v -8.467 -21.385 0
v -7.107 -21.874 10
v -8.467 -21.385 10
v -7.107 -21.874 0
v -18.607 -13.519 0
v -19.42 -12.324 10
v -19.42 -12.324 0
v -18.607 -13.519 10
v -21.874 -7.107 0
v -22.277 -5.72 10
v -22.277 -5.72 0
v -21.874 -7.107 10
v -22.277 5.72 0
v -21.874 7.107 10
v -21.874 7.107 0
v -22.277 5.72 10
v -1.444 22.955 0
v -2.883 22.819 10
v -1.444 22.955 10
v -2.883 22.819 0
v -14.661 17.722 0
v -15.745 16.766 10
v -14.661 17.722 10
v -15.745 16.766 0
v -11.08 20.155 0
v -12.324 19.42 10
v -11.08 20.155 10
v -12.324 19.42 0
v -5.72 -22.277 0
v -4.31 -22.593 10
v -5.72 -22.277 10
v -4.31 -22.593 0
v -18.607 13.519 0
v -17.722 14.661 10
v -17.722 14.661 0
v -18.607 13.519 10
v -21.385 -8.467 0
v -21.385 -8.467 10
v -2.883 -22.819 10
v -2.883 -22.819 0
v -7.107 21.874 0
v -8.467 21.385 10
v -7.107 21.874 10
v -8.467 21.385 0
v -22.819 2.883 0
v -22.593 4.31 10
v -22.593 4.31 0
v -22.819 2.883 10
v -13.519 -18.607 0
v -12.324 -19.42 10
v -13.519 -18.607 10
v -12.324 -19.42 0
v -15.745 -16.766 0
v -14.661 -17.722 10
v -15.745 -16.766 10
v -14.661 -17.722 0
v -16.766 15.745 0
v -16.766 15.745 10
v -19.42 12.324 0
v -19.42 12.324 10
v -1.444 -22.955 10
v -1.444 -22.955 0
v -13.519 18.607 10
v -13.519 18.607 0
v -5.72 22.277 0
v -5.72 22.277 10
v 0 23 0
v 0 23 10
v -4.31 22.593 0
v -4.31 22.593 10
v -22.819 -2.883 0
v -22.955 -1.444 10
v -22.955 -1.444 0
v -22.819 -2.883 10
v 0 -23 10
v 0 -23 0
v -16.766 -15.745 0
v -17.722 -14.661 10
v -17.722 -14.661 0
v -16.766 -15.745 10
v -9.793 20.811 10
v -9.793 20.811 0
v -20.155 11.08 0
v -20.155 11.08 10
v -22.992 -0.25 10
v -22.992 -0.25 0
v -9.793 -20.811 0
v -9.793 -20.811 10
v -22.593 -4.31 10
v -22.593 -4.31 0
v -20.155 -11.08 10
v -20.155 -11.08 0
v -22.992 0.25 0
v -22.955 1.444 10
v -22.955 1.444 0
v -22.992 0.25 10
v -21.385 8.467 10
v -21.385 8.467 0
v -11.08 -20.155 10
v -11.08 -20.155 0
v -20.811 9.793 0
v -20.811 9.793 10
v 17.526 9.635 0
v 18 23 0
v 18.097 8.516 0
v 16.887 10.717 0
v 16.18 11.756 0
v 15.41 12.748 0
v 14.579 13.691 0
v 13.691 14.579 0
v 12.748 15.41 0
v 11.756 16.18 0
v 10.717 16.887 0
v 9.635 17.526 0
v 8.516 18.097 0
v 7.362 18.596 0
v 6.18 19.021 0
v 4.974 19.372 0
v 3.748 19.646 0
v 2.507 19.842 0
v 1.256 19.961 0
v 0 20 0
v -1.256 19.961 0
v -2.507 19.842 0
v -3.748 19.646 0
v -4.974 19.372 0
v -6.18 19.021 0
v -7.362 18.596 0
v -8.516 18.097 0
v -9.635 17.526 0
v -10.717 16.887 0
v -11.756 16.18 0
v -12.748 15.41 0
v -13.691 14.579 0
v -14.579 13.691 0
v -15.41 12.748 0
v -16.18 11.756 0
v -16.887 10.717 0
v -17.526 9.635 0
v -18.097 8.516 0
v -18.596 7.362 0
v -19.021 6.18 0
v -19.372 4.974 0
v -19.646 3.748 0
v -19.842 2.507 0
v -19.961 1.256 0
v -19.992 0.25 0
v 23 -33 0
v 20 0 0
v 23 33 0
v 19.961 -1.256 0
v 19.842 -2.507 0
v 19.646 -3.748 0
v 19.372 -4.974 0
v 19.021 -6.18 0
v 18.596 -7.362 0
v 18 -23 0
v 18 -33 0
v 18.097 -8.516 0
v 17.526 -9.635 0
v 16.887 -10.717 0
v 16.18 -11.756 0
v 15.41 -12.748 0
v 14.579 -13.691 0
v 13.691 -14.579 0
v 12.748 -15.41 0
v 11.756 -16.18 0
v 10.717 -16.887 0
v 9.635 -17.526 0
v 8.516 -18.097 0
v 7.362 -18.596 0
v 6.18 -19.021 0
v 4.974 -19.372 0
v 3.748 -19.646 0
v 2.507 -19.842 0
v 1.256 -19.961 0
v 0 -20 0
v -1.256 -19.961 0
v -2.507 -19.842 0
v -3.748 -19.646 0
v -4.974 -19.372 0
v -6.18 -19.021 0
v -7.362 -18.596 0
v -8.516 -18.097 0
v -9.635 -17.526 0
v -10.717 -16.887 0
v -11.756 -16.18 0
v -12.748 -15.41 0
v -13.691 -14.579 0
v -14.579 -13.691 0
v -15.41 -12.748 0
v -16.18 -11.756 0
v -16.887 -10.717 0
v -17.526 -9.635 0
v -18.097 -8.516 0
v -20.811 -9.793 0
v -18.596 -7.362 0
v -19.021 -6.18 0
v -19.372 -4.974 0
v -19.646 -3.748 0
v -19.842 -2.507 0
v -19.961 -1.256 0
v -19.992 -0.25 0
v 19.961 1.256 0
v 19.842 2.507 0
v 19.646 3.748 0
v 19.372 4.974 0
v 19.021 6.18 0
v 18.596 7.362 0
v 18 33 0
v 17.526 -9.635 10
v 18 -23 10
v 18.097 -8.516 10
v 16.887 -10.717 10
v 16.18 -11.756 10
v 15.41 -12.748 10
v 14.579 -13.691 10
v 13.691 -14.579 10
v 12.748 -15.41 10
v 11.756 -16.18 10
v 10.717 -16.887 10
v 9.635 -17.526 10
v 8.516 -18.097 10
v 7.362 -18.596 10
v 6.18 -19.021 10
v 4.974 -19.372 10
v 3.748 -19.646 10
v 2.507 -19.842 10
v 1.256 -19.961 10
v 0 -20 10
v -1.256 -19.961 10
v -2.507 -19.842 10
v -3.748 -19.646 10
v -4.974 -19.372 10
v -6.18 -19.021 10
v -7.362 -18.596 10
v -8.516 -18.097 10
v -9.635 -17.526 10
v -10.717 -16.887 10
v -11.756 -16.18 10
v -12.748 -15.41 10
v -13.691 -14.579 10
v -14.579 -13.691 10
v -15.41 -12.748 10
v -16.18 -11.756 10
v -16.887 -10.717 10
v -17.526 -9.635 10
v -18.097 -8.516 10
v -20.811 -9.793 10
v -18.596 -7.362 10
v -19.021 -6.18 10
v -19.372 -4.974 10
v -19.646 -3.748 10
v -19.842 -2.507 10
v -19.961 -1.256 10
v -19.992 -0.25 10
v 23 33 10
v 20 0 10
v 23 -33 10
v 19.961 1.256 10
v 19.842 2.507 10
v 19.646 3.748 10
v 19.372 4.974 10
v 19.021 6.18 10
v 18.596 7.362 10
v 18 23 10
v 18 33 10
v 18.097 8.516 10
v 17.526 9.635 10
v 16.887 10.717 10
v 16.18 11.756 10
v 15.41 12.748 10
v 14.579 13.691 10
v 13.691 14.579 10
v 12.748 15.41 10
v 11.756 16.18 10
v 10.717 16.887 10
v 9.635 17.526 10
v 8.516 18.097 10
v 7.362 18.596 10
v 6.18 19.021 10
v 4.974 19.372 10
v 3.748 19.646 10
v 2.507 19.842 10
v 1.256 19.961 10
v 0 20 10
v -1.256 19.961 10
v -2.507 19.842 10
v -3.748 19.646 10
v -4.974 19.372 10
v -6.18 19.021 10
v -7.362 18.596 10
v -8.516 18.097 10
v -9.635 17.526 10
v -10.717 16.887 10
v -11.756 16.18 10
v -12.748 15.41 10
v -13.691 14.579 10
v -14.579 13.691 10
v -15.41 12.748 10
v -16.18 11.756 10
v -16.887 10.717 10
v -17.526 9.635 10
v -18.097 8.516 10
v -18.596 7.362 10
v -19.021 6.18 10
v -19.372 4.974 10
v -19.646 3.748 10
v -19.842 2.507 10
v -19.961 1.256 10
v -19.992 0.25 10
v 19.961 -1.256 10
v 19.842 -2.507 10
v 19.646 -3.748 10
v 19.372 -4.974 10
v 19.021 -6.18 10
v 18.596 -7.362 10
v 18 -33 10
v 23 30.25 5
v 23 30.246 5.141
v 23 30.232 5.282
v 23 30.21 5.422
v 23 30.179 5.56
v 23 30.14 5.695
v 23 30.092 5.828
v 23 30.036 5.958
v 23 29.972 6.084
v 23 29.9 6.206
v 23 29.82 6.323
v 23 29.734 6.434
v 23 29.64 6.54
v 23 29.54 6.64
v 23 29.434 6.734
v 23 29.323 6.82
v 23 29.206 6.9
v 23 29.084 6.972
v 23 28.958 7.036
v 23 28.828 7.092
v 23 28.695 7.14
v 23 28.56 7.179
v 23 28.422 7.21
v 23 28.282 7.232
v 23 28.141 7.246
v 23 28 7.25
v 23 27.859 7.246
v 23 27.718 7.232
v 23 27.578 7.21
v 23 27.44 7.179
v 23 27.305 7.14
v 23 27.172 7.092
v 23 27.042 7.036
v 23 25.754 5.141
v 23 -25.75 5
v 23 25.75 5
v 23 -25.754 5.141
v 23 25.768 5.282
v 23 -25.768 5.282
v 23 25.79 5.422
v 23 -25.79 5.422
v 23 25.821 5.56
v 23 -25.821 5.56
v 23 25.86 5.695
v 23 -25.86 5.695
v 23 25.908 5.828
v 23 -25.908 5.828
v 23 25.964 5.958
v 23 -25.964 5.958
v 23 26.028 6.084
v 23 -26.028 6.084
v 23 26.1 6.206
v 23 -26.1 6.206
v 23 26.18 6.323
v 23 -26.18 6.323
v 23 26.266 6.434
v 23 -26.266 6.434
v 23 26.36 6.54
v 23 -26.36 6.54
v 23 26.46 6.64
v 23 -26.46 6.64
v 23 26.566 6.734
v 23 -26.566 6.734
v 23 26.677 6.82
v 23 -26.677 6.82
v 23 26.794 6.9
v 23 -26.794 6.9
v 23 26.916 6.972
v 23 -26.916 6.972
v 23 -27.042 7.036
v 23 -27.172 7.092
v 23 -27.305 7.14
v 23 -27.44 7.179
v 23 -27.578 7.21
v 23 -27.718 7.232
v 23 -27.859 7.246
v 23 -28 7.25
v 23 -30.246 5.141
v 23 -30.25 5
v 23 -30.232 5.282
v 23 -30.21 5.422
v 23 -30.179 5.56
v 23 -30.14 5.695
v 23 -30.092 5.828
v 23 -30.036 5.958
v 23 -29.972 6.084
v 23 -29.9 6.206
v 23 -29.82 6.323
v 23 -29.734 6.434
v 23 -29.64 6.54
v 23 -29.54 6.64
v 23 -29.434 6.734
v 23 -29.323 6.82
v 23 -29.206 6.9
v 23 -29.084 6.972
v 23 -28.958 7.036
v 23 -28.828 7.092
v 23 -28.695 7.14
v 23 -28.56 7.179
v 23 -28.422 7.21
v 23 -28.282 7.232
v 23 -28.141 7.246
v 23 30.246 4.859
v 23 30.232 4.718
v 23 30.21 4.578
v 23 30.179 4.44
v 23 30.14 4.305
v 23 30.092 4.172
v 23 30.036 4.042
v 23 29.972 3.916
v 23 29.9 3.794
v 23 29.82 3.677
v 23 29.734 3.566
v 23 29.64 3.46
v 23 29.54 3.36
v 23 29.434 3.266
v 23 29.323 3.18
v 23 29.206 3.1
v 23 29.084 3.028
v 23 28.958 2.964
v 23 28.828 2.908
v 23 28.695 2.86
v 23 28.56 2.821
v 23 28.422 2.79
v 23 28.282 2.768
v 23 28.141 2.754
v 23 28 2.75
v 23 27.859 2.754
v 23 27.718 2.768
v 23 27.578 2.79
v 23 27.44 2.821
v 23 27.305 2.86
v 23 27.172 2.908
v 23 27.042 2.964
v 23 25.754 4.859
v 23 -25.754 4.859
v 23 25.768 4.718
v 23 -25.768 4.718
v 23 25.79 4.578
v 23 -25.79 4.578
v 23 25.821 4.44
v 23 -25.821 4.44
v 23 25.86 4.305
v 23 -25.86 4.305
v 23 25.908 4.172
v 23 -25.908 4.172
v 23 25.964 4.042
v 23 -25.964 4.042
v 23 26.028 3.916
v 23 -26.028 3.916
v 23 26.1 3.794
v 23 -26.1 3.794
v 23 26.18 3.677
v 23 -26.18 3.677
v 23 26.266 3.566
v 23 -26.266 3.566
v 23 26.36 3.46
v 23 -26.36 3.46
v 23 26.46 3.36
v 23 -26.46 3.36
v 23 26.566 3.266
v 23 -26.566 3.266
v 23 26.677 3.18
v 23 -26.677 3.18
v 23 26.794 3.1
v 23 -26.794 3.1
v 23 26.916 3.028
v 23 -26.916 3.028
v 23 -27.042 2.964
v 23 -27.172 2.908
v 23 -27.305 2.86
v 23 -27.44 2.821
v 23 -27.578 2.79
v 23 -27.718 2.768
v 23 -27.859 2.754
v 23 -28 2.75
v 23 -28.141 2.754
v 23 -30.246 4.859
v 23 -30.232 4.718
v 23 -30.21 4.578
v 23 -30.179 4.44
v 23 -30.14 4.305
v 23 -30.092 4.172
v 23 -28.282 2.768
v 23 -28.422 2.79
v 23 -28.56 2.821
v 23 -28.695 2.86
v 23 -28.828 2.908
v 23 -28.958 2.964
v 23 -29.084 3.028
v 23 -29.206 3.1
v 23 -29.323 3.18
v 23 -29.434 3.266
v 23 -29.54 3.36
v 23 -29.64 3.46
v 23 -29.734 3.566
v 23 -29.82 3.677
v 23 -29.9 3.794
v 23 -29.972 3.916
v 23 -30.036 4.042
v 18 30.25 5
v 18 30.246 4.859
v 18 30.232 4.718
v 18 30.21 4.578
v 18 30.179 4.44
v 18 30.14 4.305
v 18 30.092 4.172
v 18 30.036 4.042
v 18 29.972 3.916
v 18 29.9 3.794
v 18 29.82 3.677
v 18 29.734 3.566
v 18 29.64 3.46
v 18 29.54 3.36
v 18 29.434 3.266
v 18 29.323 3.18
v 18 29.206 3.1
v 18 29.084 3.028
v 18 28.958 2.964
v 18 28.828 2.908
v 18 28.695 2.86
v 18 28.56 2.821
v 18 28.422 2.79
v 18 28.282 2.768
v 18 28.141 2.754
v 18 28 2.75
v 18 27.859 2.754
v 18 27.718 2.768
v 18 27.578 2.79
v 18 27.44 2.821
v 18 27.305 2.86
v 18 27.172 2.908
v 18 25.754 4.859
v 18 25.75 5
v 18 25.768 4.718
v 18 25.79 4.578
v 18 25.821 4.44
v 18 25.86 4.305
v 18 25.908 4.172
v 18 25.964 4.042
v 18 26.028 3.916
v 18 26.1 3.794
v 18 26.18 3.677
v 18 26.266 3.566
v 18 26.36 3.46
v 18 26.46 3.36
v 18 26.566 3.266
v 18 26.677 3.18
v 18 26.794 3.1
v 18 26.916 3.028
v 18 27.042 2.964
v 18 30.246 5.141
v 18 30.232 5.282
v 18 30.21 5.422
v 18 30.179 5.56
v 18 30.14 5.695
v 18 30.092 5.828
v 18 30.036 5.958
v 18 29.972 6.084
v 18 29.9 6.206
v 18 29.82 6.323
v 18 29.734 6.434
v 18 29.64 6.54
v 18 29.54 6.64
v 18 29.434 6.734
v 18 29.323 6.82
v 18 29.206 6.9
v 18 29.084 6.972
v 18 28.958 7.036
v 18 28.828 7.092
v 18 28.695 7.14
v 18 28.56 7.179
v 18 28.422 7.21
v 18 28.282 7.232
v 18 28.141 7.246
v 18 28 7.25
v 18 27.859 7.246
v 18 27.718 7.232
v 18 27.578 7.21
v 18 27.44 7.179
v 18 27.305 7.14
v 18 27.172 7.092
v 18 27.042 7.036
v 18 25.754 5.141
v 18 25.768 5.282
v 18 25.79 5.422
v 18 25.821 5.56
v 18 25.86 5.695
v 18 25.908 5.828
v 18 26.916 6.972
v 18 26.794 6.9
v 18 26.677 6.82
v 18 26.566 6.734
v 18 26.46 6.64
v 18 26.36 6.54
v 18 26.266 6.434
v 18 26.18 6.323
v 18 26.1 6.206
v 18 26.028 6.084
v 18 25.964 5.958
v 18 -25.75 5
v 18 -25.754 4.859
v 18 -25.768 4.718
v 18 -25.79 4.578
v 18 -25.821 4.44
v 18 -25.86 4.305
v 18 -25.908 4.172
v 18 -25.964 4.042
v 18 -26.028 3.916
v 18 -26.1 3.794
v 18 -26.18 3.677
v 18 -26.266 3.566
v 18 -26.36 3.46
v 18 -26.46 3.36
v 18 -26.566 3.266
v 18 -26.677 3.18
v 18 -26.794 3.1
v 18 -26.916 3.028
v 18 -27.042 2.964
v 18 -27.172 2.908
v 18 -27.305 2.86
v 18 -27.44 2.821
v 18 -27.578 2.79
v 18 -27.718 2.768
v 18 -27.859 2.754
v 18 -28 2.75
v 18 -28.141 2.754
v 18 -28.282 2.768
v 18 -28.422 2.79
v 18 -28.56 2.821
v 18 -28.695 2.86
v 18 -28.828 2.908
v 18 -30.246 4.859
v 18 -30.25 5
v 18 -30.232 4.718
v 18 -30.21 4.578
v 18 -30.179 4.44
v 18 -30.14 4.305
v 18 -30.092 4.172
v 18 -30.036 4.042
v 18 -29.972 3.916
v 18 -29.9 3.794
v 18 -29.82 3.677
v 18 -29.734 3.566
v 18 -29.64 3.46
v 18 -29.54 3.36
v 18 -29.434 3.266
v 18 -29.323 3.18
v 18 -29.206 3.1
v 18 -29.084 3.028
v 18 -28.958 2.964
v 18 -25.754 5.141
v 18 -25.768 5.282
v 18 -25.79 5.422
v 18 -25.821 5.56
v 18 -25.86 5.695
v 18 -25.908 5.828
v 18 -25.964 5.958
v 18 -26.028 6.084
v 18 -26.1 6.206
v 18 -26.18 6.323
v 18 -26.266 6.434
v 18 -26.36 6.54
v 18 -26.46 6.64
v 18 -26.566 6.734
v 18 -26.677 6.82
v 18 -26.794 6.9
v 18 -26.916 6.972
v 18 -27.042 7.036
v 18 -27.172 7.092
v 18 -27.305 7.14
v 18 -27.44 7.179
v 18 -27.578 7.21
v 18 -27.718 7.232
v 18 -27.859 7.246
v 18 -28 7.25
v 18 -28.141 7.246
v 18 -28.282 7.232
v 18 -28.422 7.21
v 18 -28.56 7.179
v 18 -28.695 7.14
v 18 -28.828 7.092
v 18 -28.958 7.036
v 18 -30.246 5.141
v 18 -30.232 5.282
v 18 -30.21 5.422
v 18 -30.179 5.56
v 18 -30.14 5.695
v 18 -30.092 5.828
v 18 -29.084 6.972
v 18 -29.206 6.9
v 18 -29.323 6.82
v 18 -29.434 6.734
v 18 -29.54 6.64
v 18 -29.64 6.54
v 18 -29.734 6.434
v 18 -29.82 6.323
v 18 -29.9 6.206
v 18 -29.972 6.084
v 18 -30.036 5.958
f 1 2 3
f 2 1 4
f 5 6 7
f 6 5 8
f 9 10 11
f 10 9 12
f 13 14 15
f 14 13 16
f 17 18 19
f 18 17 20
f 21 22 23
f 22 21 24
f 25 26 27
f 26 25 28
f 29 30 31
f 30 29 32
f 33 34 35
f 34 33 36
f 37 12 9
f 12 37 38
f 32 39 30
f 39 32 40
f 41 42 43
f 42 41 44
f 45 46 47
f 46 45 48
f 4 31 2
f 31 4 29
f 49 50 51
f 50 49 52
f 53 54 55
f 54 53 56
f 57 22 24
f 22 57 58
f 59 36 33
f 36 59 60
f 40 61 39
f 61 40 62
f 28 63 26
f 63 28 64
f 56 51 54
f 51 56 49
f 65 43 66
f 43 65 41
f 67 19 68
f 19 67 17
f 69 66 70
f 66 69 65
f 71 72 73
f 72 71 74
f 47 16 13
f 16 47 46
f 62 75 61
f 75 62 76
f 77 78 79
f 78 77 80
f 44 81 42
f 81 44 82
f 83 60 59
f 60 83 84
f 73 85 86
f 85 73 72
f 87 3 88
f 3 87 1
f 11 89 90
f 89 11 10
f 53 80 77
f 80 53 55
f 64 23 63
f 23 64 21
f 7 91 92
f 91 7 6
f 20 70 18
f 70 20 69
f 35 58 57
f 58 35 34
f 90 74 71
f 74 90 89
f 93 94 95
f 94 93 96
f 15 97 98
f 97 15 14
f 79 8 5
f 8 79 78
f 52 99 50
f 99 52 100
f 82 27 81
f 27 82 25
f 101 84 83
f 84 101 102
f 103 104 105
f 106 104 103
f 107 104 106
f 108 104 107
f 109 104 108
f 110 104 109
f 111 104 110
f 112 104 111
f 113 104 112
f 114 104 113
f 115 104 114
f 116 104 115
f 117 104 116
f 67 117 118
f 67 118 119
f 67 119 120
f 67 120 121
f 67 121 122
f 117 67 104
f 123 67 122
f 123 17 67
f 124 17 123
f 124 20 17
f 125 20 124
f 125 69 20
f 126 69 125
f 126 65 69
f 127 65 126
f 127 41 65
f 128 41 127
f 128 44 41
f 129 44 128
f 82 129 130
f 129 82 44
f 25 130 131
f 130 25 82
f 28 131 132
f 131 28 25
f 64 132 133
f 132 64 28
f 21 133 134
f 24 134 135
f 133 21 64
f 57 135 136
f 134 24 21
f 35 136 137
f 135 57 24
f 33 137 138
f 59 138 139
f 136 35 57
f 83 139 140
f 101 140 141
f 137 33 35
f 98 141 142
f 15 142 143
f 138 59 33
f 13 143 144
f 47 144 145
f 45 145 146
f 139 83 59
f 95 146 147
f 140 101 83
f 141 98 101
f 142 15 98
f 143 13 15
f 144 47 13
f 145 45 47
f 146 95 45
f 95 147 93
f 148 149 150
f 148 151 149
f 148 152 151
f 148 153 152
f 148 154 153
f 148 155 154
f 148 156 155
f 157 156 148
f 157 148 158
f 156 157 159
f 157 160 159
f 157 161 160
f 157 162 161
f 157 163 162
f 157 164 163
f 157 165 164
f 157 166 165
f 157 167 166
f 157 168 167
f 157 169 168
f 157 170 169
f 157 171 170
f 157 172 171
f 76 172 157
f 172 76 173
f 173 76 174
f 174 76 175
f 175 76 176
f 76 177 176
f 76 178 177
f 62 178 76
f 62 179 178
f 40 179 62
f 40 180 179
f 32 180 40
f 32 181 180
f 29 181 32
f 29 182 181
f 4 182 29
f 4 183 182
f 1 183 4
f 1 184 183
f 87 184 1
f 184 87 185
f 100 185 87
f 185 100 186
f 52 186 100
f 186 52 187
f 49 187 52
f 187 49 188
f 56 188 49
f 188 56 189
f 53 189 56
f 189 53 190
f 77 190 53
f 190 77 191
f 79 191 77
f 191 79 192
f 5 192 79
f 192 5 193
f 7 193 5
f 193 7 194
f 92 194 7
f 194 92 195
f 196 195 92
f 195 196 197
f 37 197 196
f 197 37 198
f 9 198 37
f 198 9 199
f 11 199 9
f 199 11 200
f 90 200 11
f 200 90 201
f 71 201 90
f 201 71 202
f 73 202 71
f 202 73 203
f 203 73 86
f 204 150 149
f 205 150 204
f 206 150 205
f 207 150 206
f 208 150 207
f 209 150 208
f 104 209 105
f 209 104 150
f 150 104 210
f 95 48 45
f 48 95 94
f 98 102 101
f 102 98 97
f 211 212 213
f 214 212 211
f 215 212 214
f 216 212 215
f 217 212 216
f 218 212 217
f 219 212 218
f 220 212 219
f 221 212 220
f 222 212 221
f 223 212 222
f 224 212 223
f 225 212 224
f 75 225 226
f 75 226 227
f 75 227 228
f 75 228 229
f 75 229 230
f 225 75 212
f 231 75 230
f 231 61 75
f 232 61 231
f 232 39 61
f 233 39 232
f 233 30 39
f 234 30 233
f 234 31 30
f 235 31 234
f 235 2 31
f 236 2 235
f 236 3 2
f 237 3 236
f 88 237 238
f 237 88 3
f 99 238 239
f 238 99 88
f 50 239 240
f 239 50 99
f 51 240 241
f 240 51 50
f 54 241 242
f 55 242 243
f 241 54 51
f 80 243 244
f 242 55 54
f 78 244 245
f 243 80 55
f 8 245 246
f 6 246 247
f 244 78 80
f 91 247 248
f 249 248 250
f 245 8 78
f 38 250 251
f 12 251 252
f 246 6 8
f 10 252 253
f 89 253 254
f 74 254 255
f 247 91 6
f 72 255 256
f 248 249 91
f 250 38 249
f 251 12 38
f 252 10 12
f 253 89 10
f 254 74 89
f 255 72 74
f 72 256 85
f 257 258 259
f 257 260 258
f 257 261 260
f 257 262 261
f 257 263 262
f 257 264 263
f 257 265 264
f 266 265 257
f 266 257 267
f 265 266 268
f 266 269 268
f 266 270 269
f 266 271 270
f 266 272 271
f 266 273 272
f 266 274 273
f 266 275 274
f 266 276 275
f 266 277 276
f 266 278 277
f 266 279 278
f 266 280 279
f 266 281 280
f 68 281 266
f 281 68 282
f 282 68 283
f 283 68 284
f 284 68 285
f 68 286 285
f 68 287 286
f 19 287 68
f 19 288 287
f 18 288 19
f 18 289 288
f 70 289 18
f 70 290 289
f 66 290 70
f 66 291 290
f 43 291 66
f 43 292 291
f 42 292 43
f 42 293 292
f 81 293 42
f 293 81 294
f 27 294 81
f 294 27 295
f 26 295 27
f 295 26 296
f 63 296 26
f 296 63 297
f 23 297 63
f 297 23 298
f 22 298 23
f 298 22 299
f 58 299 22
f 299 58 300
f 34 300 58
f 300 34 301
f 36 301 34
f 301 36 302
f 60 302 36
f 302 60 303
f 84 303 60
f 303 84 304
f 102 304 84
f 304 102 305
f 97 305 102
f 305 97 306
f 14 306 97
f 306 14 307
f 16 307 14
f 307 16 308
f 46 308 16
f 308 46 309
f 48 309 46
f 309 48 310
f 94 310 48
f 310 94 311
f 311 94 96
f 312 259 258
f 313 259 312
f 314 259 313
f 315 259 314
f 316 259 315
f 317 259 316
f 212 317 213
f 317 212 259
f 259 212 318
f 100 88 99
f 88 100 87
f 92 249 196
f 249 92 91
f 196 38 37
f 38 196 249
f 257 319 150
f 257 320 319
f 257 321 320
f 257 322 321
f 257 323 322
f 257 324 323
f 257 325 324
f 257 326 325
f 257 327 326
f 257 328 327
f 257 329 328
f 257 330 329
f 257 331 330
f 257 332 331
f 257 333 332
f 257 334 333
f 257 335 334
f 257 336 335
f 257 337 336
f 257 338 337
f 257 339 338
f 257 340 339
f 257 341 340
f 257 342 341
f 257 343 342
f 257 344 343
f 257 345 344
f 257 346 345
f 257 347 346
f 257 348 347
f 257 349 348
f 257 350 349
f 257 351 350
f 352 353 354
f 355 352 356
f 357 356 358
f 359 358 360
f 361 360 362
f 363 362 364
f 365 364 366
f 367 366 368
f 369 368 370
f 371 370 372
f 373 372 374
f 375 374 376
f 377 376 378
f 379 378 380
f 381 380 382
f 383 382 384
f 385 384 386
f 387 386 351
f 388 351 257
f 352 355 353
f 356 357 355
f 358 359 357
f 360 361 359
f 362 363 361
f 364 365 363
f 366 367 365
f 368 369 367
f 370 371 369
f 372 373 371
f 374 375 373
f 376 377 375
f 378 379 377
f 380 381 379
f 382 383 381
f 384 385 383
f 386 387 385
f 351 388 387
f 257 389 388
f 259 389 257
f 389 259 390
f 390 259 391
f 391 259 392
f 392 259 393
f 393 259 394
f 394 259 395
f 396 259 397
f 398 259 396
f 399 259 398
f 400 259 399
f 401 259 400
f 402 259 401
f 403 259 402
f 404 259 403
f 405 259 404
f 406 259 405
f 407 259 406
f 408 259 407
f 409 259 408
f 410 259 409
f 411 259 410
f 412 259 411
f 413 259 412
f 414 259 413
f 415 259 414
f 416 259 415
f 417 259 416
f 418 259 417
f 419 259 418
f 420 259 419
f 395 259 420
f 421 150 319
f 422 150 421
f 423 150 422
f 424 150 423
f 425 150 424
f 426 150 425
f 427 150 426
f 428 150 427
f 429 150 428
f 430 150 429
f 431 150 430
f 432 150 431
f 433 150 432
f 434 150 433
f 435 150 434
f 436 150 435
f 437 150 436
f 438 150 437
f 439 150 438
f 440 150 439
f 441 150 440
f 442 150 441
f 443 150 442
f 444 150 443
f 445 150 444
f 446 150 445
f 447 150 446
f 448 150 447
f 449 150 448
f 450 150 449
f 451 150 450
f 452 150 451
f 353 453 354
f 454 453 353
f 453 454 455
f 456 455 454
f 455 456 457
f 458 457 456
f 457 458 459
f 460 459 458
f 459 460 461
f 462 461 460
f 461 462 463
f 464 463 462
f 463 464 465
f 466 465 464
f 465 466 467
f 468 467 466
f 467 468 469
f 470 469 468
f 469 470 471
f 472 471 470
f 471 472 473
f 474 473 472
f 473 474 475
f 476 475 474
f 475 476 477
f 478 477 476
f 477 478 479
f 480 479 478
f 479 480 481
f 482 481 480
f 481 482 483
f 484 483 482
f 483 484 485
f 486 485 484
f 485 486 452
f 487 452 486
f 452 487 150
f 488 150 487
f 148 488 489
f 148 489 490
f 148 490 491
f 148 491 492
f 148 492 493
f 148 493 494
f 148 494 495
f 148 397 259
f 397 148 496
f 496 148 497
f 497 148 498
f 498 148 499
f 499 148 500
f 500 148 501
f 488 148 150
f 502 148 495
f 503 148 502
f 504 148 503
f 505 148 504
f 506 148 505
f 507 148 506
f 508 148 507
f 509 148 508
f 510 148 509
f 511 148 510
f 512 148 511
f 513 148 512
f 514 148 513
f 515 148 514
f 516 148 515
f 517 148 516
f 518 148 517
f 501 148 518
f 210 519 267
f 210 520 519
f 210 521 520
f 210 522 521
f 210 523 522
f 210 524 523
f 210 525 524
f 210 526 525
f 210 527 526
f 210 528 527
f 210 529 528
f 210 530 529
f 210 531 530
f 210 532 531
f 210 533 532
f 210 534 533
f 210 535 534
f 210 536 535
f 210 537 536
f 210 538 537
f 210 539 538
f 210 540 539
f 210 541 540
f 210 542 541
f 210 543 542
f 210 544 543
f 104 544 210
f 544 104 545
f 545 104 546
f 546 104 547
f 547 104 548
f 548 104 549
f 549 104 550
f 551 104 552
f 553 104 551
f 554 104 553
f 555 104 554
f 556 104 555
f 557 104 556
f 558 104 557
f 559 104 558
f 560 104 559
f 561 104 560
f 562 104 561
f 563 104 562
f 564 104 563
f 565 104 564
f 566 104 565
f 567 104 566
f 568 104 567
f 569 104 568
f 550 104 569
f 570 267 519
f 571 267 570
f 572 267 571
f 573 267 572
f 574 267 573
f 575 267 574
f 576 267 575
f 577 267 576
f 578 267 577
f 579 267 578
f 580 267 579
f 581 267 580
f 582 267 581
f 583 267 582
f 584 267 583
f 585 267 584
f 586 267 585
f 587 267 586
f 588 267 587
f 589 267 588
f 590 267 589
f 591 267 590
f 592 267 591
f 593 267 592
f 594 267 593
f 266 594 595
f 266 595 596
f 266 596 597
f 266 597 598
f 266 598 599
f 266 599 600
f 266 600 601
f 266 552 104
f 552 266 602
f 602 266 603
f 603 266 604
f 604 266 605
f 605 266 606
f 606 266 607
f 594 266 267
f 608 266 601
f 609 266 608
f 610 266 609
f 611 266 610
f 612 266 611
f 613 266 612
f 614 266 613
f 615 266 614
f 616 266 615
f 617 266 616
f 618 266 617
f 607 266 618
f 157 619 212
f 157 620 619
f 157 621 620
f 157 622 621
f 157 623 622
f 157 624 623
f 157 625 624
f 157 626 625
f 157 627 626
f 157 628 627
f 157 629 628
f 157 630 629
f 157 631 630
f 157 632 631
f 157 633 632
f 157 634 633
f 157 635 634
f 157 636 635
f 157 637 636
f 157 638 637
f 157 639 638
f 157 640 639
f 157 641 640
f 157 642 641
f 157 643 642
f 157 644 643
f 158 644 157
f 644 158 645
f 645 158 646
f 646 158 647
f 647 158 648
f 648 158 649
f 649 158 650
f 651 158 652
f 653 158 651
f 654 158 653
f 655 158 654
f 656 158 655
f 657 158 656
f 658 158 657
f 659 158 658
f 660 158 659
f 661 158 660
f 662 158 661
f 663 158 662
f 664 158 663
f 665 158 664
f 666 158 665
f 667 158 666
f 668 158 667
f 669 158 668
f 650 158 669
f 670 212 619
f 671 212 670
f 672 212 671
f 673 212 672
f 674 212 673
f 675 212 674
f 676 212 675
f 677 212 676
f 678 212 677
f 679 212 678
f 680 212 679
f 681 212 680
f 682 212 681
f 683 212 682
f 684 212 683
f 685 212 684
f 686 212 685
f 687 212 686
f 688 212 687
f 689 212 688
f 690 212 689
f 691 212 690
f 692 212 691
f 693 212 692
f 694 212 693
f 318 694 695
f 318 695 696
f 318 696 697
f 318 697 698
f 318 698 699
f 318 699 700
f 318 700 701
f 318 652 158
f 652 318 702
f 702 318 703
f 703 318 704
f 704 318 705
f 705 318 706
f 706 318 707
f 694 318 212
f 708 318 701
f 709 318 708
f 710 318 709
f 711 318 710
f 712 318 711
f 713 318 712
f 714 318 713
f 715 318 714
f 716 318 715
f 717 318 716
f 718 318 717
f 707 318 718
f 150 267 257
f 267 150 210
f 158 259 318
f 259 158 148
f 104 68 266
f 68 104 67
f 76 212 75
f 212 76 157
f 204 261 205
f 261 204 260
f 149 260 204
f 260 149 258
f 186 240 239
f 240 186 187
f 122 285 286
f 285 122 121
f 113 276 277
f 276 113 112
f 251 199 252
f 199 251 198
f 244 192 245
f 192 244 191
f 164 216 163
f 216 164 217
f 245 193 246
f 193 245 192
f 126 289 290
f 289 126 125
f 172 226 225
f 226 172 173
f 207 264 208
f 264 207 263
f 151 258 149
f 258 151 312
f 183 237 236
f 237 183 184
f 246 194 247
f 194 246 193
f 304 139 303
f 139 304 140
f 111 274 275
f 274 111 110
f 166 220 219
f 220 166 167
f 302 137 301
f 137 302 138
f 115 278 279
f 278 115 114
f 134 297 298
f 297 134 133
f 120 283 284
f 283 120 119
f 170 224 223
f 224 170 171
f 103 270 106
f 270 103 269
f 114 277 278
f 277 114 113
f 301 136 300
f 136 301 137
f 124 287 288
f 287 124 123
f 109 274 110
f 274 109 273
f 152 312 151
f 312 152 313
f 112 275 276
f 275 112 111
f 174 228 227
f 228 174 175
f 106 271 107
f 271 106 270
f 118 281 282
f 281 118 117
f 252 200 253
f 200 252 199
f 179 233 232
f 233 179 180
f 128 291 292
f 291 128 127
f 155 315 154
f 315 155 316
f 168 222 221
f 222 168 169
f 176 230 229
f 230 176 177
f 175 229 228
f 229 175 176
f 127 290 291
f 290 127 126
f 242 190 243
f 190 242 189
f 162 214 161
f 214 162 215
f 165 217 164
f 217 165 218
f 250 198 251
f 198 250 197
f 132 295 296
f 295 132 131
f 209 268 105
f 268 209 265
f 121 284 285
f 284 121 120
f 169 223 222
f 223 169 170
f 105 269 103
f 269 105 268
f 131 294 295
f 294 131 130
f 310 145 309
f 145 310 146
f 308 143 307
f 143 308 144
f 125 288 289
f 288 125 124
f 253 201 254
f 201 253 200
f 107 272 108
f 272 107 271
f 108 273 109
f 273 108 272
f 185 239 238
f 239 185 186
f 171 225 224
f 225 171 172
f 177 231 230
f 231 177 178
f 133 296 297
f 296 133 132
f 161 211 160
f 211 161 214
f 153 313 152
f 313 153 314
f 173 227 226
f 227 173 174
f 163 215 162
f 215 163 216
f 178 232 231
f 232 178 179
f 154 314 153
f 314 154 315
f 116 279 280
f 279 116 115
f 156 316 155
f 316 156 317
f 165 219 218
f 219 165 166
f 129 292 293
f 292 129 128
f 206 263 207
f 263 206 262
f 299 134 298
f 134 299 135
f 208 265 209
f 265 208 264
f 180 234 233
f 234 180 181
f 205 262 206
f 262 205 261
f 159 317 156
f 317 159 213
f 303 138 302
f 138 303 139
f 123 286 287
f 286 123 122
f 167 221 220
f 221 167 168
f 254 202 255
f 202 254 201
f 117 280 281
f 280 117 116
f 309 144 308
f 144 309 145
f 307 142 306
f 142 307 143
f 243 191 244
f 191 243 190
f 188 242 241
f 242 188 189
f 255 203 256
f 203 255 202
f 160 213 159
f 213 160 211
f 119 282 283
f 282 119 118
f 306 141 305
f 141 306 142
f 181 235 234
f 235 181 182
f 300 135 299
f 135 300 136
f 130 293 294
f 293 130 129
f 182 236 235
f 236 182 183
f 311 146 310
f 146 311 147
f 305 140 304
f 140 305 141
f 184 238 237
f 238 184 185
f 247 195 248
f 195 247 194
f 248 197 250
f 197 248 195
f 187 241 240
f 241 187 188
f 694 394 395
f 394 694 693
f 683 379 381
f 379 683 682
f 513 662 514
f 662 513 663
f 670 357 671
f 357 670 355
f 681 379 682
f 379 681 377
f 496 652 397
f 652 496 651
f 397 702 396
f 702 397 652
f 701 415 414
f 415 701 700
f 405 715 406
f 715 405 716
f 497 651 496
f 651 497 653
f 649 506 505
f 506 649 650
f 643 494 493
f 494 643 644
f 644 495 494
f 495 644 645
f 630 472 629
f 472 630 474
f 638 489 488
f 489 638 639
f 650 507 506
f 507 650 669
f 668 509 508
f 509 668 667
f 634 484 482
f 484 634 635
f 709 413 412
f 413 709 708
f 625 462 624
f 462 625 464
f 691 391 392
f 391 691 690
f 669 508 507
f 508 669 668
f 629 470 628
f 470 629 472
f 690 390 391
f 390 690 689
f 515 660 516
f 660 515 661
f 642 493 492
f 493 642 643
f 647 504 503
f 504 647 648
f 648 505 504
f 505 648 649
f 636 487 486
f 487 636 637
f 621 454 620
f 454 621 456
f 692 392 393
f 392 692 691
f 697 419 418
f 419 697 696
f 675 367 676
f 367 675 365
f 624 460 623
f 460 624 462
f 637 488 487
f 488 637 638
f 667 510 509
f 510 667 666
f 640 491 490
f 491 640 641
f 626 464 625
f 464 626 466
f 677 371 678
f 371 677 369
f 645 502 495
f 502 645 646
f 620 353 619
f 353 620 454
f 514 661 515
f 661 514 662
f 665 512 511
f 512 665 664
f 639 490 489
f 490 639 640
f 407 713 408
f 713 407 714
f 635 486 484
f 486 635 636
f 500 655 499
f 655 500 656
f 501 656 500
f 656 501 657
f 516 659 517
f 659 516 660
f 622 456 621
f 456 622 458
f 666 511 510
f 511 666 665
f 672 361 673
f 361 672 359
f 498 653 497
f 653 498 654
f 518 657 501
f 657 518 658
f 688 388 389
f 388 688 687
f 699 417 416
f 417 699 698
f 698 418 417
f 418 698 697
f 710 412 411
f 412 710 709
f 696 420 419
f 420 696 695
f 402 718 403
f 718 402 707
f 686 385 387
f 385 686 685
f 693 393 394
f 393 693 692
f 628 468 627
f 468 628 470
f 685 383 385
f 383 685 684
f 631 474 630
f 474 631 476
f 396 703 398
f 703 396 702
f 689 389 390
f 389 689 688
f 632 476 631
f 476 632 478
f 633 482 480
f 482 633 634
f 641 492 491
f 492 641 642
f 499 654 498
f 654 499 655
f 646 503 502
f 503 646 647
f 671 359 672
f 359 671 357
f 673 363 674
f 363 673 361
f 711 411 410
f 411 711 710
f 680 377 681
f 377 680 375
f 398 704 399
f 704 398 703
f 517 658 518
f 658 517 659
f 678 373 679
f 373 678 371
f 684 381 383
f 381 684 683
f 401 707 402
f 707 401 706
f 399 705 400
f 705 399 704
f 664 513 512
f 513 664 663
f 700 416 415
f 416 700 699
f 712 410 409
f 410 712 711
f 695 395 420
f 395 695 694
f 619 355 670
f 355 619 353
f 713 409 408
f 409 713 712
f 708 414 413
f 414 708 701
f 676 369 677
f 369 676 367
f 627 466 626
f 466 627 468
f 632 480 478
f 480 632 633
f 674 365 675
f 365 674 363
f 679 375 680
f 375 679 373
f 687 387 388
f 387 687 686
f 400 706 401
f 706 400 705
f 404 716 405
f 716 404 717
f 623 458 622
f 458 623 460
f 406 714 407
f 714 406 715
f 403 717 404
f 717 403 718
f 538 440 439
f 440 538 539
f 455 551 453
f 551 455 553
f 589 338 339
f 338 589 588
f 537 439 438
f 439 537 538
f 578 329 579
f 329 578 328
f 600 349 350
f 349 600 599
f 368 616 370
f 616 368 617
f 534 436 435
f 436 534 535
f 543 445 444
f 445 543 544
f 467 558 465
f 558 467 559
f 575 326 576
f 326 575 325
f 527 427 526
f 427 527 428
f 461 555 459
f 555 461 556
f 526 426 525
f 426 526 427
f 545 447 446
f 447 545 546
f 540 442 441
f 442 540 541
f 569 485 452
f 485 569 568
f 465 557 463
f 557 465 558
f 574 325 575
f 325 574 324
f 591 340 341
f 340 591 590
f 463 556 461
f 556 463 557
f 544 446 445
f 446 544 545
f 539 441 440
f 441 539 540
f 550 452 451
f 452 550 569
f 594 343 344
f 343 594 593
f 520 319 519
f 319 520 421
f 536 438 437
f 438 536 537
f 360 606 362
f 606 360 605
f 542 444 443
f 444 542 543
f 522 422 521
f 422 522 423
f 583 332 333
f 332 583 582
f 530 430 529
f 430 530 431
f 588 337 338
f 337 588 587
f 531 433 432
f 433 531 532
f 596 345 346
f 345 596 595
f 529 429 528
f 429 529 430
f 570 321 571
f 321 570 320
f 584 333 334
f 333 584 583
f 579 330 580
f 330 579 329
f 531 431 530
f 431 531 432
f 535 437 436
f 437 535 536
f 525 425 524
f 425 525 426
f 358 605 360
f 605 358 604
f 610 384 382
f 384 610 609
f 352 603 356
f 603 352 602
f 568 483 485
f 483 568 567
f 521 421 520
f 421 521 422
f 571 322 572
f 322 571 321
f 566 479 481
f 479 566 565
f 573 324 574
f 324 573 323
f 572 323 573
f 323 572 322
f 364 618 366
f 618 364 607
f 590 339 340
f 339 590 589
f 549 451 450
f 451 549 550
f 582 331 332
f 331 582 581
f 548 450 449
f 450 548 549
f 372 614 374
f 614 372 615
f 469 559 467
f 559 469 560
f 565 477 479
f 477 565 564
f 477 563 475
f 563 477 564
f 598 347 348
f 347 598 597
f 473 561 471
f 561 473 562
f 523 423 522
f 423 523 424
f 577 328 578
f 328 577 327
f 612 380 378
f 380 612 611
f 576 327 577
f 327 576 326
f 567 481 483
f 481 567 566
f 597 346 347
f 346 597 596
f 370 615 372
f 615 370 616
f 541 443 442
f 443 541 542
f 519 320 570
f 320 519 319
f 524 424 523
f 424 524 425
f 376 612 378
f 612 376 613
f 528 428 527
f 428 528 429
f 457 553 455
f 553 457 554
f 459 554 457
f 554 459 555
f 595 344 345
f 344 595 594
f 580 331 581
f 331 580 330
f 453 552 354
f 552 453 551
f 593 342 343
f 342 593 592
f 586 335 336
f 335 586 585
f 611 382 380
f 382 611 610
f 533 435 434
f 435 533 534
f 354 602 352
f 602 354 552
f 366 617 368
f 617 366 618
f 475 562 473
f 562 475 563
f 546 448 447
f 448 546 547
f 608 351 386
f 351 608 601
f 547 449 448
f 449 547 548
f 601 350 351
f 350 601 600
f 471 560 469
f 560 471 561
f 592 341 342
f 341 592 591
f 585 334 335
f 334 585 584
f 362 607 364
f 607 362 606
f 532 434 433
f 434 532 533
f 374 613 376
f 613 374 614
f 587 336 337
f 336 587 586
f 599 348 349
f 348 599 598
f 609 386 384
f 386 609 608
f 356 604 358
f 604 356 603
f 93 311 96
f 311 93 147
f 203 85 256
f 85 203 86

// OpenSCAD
// [FL_INDEX: keywords="openscad, 3d_parametric, Parametric_Cable_Tamer, csg_solid" | COT="Parametric OpenSCAD design from 3DCodeverse"]
// Title: Parametric Cable Tamer

//Cable organizer
//John Finch 2-6-14

inner_dia=40; 		//large inner hole
wall=3;  			//wall thickness of loop
tab_length=10; 		//mounting tab length
tab_thickness=5;		//mounting tab thickness
clip_width=10; 		//height of loop along Z axis
mount_hole_dia=4.5;	//screw hole diameter
opening=1;			//1 for a gap in loop, 0 for a solid loop
opening_width=.5;	//opening width if enabled


fn=100;


difference(){

	union(){
  	//place outer ring
	cylinder(h=clip_width,r1=inner_dia/2+wall,r2=inner_dia/2+wall,$fn=fn);

	//place mounting tabs
	translate([inner_dia/2+wall-tab_thickness,-(inner_dia+2*wall+2*tab_length)/2,0])
	cube([tab_thickness,inner_dia+2*wall+2*tab_length,clip_width]);

	//place lower cube
	translate([0,-inner_dia/2-wall,0])
	cube([inner_dia/2+wall,inner_dia+2*wall,clip_width]);
	}

//cut inner hole
cylinder(h=clip_width,r1=inner_dia/2,r2=inner_dia/2,$fn=fn);

//cut hole in mounting tab 1
translate([inner_dia/2+wall-tab_thickness*1.01,-(inner_dia/2+wall+tab_length/2),clip_width/2])
rotate([0,90,0])
cylinder(h=tab_thickness*1.05,r1=mount_hole_dia/2,r2=mount_hole_dia/2,$fn=fn);

//cut hole in mounting tab 2
translate([inner_dia/2+wall-tab_thickness*1.01,(inner_dia/2+wall+tab_length/2),clip_width/2])
rotate([0,90,0])
cylinder(h=tab_thickness*1.05,r1=mount_hole_dia/2,r2=mount_hole_dia/2,$fn=fn);

//slice ring
if (opening == 1)
	{
	translate([-(inner_dia/2+wall),-opening_width/2,0])
	cube([inner_dia/2,opening_width,clip_width]);
	}
}
